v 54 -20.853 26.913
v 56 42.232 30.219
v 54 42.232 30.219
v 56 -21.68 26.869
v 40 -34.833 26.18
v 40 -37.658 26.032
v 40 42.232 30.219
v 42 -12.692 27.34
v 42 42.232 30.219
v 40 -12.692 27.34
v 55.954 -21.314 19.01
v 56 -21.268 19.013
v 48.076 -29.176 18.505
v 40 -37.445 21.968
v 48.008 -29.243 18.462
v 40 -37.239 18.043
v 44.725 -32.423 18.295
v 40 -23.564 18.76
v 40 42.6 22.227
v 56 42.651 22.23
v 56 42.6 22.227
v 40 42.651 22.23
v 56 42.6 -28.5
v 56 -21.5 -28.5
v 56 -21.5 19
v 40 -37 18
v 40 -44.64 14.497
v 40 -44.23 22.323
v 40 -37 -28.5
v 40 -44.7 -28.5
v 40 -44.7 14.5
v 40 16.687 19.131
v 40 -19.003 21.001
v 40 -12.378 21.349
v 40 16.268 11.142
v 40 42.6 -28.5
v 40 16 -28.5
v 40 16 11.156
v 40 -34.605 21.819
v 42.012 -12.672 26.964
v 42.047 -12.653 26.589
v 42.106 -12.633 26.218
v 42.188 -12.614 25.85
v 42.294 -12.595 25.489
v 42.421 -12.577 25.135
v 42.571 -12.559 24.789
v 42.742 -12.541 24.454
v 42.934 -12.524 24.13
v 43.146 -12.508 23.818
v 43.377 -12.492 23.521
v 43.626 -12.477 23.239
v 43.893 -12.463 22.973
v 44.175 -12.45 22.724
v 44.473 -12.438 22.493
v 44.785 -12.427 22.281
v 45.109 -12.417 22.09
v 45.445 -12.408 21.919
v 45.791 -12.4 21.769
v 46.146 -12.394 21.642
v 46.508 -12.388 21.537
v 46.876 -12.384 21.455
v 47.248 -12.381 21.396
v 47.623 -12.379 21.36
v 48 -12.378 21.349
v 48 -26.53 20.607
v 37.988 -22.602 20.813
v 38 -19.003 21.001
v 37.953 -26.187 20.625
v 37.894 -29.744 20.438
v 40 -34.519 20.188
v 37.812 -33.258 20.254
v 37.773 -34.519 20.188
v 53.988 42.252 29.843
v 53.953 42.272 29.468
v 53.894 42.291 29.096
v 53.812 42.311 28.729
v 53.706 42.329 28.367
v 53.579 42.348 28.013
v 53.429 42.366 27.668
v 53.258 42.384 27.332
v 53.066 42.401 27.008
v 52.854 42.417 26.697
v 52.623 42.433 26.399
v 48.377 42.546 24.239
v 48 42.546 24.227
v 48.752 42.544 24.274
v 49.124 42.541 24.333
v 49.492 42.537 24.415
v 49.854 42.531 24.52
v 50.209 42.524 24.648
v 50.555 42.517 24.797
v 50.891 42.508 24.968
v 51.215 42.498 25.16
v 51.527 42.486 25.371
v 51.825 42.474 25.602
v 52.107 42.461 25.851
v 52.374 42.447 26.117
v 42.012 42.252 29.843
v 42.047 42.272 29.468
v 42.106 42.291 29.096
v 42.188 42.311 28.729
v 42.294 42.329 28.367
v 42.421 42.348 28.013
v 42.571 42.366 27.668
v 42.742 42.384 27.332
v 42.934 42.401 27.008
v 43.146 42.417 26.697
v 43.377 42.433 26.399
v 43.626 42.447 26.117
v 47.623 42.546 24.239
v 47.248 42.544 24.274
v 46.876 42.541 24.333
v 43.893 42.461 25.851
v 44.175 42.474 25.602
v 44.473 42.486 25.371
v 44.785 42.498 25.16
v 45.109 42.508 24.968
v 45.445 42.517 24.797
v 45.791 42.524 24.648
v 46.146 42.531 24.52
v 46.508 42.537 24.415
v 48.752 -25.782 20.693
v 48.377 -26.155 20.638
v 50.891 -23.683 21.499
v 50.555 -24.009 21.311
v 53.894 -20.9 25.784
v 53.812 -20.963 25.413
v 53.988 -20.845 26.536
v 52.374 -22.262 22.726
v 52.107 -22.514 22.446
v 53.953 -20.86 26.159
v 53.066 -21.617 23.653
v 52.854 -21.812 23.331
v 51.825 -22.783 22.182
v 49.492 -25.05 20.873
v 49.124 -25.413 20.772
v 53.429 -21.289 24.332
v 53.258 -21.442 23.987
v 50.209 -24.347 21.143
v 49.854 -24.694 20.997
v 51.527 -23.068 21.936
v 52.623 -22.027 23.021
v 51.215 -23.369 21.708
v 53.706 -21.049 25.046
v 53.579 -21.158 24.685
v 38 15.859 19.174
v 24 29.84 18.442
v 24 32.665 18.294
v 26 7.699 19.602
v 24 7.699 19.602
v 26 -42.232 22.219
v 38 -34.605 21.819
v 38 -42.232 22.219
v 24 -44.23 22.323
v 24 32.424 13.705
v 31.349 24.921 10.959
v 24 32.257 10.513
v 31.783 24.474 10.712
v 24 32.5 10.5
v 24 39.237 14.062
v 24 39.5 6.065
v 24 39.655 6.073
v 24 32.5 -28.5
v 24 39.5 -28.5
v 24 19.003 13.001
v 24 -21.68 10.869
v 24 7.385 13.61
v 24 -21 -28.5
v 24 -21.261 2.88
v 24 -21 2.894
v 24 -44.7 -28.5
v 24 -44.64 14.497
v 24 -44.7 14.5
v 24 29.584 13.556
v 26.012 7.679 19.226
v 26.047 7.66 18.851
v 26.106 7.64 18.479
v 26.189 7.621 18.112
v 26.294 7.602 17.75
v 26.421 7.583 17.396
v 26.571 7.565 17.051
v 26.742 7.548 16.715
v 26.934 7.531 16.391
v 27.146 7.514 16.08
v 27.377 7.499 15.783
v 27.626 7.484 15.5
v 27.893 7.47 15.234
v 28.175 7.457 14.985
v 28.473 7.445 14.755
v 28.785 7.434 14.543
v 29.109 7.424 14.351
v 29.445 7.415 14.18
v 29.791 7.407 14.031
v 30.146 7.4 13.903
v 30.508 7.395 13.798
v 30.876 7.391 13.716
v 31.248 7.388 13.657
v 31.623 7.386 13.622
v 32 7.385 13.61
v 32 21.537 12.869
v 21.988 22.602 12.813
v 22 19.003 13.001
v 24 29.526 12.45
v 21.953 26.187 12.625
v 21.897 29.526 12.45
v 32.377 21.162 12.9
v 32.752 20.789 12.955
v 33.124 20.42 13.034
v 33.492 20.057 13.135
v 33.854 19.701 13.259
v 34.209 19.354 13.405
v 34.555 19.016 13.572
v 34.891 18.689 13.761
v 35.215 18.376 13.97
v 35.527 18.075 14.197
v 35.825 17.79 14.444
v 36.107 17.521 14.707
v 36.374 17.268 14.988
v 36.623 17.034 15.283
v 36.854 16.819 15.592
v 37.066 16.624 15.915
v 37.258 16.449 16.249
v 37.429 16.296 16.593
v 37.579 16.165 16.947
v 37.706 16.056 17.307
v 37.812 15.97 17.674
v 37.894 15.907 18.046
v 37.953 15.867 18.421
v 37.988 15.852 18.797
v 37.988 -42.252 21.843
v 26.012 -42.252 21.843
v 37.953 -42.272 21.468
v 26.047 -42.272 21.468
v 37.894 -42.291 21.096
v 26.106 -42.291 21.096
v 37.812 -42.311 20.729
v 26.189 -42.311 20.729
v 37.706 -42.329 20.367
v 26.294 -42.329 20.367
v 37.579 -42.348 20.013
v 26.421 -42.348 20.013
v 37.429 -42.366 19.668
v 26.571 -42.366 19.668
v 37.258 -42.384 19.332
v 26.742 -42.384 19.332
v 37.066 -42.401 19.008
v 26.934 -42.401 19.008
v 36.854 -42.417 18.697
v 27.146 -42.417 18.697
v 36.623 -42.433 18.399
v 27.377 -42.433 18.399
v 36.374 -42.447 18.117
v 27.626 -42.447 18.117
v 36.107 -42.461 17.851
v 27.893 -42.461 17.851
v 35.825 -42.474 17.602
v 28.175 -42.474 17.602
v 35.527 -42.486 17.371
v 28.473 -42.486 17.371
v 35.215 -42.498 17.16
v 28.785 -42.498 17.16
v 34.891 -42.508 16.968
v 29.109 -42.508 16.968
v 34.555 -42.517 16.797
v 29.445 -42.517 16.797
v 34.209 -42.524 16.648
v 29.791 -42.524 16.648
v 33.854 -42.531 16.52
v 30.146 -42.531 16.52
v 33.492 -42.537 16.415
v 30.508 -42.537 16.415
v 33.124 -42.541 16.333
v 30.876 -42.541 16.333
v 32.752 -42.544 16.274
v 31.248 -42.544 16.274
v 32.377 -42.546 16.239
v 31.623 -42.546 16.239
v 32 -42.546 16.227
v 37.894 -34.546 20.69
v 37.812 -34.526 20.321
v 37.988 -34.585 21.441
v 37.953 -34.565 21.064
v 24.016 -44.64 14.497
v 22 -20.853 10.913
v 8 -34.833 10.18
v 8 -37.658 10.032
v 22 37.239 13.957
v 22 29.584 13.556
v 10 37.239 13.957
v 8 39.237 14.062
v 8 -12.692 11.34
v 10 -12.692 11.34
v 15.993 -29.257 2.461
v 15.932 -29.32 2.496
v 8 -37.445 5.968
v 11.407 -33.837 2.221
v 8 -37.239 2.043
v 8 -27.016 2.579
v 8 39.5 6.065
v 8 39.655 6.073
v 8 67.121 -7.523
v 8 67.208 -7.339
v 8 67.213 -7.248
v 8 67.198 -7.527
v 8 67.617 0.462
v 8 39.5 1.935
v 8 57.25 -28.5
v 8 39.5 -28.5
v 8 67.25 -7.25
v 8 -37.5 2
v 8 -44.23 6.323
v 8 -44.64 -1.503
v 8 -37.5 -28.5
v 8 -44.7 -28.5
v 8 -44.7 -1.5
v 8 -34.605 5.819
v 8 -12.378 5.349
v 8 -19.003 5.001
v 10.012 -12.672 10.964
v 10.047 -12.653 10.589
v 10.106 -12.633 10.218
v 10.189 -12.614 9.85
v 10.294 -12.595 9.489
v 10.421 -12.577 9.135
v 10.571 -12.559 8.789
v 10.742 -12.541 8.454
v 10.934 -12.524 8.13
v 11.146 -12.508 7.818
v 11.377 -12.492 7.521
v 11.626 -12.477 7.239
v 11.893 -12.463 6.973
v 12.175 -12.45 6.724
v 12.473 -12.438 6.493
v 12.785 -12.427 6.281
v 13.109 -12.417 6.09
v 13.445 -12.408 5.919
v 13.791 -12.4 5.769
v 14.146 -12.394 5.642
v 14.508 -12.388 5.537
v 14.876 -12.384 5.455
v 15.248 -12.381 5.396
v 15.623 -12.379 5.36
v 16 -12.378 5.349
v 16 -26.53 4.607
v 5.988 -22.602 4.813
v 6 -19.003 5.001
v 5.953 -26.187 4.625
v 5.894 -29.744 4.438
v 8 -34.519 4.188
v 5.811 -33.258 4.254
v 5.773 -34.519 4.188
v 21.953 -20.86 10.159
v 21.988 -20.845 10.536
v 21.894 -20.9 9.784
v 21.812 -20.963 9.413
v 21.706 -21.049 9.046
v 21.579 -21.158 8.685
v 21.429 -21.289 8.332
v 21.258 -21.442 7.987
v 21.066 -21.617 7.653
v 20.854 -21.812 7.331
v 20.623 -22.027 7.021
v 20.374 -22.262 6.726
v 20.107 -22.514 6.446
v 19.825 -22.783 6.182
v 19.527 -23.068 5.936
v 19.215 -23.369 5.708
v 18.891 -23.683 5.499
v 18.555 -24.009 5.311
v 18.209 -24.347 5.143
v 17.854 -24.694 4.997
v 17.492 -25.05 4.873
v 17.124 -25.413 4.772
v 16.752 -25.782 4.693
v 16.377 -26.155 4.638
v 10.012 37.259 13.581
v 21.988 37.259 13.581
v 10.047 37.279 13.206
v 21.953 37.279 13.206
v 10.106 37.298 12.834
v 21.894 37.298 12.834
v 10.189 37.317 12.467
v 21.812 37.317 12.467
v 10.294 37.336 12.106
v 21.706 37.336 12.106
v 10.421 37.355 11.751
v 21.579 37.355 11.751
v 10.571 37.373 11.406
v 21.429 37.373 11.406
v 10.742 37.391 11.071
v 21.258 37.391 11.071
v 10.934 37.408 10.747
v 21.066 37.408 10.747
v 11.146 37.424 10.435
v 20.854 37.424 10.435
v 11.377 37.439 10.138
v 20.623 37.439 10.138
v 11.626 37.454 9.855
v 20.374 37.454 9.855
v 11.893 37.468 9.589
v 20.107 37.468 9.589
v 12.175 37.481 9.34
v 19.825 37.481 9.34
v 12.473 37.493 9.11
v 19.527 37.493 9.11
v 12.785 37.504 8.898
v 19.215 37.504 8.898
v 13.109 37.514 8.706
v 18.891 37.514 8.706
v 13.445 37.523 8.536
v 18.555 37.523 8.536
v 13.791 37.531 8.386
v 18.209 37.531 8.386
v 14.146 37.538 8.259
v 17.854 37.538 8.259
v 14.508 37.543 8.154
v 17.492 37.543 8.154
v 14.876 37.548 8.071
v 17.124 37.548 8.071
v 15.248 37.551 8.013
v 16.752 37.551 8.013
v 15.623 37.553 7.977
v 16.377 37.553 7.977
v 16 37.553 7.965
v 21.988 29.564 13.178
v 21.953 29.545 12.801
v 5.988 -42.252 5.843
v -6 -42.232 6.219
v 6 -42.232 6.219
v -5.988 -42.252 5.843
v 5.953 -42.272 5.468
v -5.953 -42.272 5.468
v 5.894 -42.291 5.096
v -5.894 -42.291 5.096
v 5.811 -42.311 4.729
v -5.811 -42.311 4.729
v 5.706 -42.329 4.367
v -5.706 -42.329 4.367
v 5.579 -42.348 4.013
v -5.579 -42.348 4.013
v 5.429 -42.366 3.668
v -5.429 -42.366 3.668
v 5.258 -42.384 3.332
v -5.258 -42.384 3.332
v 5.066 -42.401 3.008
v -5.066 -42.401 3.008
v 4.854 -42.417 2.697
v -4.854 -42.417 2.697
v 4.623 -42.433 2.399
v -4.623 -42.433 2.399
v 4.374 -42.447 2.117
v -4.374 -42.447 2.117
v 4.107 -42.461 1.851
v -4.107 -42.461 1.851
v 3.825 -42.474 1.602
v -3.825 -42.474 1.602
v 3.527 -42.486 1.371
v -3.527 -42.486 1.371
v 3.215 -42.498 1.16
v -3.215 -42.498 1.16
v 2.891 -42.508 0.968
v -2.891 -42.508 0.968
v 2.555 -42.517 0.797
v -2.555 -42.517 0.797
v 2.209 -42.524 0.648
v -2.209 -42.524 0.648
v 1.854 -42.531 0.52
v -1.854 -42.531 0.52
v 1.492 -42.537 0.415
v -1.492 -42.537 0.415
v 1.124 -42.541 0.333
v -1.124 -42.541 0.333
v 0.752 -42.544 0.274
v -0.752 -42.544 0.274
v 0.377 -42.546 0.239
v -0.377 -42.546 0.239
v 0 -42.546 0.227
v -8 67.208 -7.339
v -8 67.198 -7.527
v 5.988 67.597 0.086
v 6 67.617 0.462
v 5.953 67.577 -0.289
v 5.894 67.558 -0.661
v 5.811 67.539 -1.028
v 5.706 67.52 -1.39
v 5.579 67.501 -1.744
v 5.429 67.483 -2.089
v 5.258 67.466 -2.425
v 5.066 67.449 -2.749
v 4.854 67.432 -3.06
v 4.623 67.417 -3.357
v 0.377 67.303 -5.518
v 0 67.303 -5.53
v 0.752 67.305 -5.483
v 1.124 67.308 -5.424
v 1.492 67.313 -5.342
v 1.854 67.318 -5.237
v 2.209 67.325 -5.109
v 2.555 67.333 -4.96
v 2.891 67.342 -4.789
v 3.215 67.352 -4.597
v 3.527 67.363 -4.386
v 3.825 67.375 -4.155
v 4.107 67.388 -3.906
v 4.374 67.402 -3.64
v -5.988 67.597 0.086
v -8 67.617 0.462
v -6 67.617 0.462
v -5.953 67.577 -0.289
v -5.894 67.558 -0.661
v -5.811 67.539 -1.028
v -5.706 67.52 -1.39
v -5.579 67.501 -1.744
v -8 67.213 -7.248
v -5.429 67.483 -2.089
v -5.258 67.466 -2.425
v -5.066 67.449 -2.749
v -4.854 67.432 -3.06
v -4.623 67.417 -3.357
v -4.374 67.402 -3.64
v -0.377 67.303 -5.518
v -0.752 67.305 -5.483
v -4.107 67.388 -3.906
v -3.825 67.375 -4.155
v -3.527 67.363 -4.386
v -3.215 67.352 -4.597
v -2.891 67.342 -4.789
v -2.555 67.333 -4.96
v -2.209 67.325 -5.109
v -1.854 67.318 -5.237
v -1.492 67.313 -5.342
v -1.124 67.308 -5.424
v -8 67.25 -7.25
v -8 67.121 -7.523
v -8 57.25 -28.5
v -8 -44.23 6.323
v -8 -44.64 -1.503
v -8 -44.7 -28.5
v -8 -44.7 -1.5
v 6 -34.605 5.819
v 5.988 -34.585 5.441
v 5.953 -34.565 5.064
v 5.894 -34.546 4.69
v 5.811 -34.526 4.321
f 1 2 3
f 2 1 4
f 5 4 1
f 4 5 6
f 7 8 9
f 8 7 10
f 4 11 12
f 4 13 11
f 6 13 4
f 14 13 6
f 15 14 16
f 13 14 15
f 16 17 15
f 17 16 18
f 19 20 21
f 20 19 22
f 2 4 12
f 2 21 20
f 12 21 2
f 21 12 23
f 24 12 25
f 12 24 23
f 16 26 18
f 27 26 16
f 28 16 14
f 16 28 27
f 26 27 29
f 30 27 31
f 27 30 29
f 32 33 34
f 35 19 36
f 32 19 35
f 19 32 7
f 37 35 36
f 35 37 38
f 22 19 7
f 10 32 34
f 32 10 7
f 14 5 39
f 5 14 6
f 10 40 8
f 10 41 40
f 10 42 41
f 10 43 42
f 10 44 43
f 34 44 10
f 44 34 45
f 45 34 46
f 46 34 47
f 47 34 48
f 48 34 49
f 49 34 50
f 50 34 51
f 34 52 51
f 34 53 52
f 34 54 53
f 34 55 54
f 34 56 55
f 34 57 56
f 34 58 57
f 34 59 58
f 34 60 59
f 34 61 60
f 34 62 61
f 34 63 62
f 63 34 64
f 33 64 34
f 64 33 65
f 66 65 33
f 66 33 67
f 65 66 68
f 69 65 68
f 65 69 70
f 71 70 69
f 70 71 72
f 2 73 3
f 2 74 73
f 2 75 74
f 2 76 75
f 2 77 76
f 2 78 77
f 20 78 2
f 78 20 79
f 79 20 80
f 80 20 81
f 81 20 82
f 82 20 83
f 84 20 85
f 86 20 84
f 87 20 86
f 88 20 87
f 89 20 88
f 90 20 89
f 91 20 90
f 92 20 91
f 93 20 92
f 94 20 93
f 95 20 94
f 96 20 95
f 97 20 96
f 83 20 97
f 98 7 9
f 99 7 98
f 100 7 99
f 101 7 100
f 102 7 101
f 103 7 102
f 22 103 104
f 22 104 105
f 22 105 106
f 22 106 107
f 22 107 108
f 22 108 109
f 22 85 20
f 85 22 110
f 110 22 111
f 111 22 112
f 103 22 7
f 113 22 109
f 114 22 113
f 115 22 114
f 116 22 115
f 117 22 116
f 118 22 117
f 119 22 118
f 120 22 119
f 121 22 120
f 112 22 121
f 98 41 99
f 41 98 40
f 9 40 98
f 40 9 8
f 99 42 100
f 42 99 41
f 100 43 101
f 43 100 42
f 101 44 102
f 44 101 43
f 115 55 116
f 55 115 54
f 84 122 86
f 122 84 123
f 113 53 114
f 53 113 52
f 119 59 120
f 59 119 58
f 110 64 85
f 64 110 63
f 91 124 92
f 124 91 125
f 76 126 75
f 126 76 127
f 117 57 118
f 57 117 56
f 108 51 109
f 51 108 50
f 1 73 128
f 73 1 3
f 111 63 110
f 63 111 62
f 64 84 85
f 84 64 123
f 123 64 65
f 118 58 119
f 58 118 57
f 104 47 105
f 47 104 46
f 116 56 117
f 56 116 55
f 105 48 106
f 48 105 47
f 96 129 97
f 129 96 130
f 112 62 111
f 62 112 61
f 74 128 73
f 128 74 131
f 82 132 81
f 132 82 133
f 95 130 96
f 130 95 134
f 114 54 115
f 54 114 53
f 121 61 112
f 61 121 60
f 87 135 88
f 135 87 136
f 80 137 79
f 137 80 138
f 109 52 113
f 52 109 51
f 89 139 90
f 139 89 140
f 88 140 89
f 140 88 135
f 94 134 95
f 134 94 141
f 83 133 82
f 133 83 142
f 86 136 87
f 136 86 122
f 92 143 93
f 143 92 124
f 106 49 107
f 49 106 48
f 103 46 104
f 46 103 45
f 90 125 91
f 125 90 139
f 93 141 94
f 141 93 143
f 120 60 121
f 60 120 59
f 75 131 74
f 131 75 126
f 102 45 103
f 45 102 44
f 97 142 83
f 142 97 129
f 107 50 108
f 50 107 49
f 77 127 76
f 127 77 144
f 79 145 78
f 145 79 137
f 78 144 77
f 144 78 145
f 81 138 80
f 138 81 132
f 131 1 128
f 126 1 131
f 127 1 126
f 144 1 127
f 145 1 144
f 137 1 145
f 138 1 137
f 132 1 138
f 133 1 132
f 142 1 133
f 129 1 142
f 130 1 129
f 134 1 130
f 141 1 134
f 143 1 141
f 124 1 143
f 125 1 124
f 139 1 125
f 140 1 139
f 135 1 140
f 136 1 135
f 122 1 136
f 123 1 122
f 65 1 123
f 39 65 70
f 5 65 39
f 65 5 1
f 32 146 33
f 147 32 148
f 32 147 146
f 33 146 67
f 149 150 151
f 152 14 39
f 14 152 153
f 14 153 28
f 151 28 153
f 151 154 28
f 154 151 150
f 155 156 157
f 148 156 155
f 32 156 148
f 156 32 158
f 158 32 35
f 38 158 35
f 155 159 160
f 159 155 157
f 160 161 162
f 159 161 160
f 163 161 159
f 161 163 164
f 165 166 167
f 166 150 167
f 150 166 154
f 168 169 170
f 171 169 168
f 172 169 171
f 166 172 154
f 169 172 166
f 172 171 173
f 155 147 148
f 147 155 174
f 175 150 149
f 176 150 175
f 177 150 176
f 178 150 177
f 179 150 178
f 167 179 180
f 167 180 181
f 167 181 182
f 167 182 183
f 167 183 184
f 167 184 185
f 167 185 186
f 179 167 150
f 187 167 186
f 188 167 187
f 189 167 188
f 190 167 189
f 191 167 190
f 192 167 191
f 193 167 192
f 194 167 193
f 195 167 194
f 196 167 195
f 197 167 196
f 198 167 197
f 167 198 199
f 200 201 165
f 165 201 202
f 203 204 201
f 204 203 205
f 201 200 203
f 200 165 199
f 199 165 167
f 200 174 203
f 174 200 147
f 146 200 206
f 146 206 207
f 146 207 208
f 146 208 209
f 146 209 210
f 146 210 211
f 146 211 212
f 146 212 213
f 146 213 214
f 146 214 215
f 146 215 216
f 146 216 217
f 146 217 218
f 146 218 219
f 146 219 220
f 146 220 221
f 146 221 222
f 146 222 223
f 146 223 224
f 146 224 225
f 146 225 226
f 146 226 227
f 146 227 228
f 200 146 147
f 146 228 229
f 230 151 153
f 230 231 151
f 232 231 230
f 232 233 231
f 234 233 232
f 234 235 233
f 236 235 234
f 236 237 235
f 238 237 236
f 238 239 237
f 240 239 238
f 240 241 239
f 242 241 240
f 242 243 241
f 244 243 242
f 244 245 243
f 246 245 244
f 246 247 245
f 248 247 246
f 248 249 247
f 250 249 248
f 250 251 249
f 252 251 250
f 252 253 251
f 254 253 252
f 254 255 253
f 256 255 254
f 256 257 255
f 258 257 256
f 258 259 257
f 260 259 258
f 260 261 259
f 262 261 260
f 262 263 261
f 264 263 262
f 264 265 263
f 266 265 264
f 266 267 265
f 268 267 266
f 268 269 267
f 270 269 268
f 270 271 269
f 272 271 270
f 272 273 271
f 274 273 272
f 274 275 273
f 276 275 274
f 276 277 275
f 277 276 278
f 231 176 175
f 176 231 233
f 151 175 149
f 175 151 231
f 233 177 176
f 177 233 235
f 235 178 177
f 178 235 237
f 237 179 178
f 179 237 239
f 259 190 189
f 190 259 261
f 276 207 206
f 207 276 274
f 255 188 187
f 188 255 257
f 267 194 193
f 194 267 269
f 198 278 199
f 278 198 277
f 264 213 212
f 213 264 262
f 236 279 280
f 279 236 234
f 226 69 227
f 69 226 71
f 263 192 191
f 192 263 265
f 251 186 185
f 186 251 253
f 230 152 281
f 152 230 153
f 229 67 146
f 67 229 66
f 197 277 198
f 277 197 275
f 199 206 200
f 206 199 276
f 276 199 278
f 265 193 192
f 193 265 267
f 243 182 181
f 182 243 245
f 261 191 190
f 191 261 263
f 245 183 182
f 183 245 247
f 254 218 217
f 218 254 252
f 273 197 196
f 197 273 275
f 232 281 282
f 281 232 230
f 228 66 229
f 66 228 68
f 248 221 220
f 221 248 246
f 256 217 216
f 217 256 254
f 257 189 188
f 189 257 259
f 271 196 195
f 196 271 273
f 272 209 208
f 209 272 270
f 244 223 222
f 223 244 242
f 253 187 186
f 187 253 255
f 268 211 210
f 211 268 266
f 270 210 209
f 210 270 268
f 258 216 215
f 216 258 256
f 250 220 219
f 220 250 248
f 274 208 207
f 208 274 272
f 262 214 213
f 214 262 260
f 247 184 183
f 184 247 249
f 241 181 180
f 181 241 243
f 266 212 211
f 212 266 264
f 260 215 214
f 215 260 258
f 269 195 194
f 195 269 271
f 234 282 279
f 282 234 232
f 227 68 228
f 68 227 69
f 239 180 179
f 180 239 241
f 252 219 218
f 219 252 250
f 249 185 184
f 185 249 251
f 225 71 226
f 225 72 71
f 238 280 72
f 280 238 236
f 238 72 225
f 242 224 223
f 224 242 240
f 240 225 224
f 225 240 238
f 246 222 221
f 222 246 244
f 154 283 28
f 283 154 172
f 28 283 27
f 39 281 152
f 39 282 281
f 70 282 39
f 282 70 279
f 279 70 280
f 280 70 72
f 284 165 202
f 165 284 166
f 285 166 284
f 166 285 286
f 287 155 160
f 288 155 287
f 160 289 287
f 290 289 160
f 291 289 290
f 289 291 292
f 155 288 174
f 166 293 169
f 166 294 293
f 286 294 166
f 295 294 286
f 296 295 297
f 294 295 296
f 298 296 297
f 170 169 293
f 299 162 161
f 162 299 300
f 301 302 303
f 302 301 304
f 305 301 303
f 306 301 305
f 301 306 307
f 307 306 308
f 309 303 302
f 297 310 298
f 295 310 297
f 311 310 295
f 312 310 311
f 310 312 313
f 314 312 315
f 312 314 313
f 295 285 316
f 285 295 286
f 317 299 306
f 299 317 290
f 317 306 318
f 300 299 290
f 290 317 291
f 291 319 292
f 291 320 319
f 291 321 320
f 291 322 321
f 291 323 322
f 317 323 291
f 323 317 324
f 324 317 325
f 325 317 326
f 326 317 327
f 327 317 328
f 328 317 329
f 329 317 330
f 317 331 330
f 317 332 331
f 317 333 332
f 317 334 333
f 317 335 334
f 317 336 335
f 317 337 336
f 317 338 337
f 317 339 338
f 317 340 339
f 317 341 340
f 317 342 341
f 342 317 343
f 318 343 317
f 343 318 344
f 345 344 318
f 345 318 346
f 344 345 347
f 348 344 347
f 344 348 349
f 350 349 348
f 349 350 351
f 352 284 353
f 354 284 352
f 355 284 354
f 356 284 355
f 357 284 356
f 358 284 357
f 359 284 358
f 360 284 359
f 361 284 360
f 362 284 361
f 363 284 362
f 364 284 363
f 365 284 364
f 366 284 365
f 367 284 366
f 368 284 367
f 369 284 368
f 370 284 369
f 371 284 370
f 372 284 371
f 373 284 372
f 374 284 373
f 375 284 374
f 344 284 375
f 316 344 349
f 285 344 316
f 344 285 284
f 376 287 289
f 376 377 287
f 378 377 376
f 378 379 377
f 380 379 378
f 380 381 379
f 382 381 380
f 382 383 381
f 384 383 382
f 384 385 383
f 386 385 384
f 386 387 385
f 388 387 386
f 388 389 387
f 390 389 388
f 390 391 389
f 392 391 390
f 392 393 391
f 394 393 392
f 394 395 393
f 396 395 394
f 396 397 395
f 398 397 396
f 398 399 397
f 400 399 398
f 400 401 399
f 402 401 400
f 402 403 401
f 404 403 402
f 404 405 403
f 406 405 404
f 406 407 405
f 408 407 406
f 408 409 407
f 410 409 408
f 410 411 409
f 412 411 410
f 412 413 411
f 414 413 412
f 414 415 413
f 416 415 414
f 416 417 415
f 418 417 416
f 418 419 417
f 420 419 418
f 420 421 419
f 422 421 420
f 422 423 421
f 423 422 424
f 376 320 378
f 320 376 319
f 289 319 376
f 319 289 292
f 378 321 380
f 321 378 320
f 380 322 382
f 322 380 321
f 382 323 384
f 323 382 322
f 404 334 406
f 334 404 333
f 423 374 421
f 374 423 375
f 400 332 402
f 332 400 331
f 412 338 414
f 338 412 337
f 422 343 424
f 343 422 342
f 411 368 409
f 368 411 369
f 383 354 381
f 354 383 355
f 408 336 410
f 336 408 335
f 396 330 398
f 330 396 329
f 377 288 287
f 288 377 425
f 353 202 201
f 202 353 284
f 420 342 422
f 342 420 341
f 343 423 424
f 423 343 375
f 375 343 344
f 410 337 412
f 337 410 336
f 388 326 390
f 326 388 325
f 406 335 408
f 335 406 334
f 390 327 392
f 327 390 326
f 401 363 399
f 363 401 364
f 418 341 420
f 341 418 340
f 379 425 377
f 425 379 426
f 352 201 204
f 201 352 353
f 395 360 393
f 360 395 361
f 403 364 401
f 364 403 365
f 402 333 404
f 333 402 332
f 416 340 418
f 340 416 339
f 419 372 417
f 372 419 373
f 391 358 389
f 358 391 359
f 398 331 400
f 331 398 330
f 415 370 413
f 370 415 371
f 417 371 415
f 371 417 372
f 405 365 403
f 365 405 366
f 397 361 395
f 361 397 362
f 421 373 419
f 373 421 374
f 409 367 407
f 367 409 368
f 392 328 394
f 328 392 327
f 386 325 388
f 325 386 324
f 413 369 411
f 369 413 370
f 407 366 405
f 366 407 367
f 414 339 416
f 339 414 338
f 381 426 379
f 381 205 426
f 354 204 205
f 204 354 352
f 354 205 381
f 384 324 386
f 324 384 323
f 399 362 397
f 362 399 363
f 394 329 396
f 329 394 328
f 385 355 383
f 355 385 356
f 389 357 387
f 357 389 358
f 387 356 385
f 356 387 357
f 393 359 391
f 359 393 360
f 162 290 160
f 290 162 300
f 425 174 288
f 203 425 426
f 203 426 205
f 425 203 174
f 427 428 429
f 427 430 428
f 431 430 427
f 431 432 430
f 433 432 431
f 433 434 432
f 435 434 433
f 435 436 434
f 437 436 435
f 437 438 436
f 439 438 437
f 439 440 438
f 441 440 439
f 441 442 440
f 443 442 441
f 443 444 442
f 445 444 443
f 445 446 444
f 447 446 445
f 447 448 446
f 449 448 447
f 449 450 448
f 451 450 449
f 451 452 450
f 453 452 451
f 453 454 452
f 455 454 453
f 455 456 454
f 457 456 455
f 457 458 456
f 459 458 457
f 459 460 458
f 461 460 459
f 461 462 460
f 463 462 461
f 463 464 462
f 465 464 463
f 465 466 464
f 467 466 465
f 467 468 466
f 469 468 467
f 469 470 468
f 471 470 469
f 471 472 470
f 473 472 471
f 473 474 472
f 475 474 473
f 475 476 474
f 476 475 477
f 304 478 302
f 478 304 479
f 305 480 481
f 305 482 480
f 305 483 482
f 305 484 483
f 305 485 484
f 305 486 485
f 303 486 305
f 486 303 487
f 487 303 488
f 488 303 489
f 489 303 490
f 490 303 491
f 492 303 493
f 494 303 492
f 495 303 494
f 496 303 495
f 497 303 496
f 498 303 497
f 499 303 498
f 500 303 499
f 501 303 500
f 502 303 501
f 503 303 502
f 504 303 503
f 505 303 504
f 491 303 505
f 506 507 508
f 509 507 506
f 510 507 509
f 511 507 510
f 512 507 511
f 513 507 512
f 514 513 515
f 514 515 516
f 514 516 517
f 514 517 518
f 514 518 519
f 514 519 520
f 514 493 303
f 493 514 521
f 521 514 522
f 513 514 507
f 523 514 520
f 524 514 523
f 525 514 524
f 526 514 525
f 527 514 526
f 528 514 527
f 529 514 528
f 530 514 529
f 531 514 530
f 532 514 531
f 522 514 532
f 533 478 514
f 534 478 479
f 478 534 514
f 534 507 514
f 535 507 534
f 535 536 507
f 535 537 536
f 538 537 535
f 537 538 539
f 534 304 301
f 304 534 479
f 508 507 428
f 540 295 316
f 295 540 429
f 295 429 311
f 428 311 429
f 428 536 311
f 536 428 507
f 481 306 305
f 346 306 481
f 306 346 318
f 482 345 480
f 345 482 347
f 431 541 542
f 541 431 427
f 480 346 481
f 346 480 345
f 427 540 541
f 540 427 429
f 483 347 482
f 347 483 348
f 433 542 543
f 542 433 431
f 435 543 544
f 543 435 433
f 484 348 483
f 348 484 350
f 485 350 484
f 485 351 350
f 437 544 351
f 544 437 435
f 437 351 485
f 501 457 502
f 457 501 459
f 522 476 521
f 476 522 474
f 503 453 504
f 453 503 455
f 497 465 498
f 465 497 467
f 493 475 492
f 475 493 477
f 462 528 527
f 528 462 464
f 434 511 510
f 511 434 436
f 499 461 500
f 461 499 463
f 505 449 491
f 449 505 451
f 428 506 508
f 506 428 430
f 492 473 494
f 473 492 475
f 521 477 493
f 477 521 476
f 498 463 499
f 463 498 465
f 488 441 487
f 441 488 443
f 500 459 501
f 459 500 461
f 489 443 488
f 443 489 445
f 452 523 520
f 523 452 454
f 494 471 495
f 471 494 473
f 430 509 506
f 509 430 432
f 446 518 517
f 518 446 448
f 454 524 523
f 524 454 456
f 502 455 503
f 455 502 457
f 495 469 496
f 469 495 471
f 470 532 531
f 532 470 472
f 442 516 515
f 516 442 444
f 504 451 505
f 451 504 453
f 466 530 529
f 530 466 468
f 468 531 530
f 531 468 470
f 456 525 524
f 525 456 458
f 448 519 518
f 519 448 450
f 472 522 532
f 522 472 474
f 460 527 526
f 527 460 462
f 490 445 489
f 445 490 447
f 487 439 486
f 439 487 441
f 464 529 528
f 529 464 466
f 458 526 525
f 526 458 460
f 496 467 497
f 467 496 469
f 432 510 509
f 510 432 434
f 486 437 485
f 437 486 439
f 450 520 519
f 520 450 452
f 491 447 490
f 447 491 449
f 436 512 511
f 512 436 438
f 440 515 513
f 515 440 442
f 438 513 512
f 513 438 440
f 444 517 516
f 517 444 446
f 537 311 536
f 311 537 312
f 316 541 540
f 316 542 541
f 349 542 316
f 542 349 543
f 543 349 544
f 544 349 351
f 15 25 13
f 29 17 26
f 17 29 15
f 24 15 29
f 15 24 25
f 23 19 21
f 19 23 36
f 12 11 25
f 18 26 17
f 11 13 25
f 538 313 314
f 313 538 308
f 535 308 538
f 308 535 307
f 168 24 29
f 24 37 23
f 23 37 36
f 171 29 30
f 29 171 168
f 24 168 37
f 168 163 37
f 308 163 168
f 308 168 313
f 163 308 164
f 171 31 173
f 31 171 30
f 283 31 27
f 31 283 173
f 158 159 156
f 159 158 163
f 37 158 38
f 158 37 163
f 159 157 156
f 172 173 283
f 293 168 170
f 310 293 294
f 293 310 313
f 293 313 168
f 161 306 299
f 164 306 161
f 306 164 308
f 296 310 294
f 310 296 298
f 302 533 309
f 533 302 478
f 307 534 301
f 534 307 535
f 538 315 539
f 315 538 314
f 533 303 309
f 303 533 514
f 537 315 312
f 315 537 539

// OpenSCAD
module ball_channel(length, diverter = false, endcap = false, mask = false) {
	translate(v = [-(16/2), -(length/2), (8/2)])
	rotate(a = -90, v = [1, 0, 0])
	union() {
		difference() {
			cube(
				size = [16, 8, length]
			);
			
			translate(v = [8, 0, 0])
			cylinder(
				h = length,
				r = 6,
				$fn = 100
			);
	
			if (diverter) {
				polyhedron(
					points = [
						[0, 0, 0],
						[16, 0, 0],
						[16, 8, 0],
						[0, 8, 0],
						[0, 0, 16],
						[0, 8, 16]
					],
					faces = [
						[0, 1, 2, 3],
						[0, 4, 1],
						[3, 2, 5],
						[0, 3, 5, 4],
						[1, 4, 5, 2]
					]
				);
	
				translate(v = [8, 0, 0])
				cube(
					size = [8, 6, 25]
				);
			}
		}

		if (mask && diverter) {
			translate(v = [8, 0, sqrt(2*2+2*2)])
			cube(
				size = [8*2, 6, 25]
			);
		}
	
		if (diverter) {
			difference() {
				translate(v = [0, 0, 16])
				rotate(a = 45, v = [0, 1, 0])
				cube(
					size = [sqrt(16*16+16*16), 8, 2]
				);
	
				translate(v = [16, 0, 0])
				cube(size = [2, 8, 3]);
			}
		}

		if (endcap) {
				translate(v = [0, 0, length])
				cube(
					size = [16, 8, 2]
				);

		}
	}
}

module position_ball_channel(angle, level = 0) {
	translate(v = [16*level, 0, 8*level])
	rotate(a = angle, v = [1, 0, 0])
	children();
}


module ball_ladder() {
	position_ball_channel(angle = 3, level = 3)
	translate(v = [0, 2.5, 0])
	mirror([1, 0, 0])
	ball_channel(length = 80, diverter = true);
	
	difference() {
		position_ball_channel(angle = -3, level = 2)
		translate(v = [0, -5, 0])
		rotate(a = 180, v = [0, 0, 1])
		ball_channel(length = 75, diverter = true, endcap = true);
	
		position_ball_channel(angle = 3, level = 3)
		translate(v = [0, 2.5, 0])
		mirror([1, 0, 0])
		ball_channel(length = 80, diverter = true, mask = true);
	}
	
	difference() {
		position_ball_channel(angle = 3, level = 1)
		mirror([1, 0, 0])
		ball_channel(length = 75, diverter = true, endcap = true);
	
		position_ball_channel(angle = -3, level = 2)
		translate(v = [0, -5, 0])
		rotate(a = 180, v = [0, 0, 1])
		ball_channel(length = 75, diverter = true, endcap = true, mask = true);
	}
	
	difference() {
		position_ball_channel(angle = -3)
		translate(v = [0, 25/2, 0])
		mirror([0, 1, 0])
		ball_channel(length = 85+25, endcap = true);
	
		position_ball_channel(angle = 3, level = 1)
		mirror([1, 0, 0])
		ball_channel(length = 75, diverter = true, endcap = true, mask = true);
	}
}

module ball_ladder_support() {
	polyhedron(
		points = [
			// back points
			[16*3+8, 80/2+2.6, 8*3-1.5],
			[16*3+8, 80/2+2.6, -28.5],
			[16*3-8, 80/2+2.6, 8*3-1.5],
			[16*3-8, 80/2+2.6, -28.5],

			// front points
			[16*3+8, -80/2+18.5, 8*3-5],
			[16*3+8, -80/2+18.5, -28.5],
			[16*3-8, -80/2+3, 8*3-6],
			[16*3-8, -80/2+3, -28.5],
		],
		faces = [
			[0, 2, 3, 1],
			[6, 4, 5, 7],
			[4, 0, 1, 5],
			[2, 6, 7, 3],
			[1, 3, 7, 5],
			[6, 2, 0, 4]
		]
	);

	polyhedron(
		points = [
			// back points
			[16*2+8, 75/2-21.5, 8*2-4.5],
			[16*2+8, 75/2-21.5, -28.5],
			[16*2-8, 75/2-5, 8*2-5.5],
			[16*2-8, 75/2-5, -28.5],

			// front points
			[16*2+8, -75/2-7.2, 8*2-1.5],
			[16*2+8, -75/2-7.2, -28.5],
			[16*2-8, -75/2-7.2, 8*2-1.5],
			[16*2-8, -75/2-7.2, -28.5],
		],
		faces = [
			[0, 2, 3, 1],
			[6, 4, 5, 7],
			[4, 0, 1, 5],
			[2, 6, 7, 3],
			[1, 3, 7, 5],
			[6, 2, 0, 4]
		]
	);

	polyhedron(
		points = [
			// back points
			[16*1+8, 75/2+2, 8*1-1.75],
			[16*1+8, 75/2+2, -28.5],
			[16*1-8, 75/2+2, 8*1-1.75],
			[16*1-8, 75/2+2, -28.5],

			// front points
			[16*1+8, -75/2+16.5, 8*1-5],
			[16*1+8, -75/2+16.5, -28.5],
			[16*1-8, -75/2, 8*1-6],
			[16*1-8, -75/2, -28.5],
		],
		faces = [
			[0, 2, 3, 1],
			[6, 4, 5, 7],
			[4, 0, 1, 5],
			[2, 6, 7, 3],
			[1, 3, 7, 5],
			[6, 2, 0, 4]
		]
	);

	polyhedron(
		points = [
			// back points
			[16*0+8, 80/2+27.25, 8*0-7.25],
			[16*0+8, 80/2+27.25-10, -28.5],
			[16*0-8, 80/2+27.25, 8*0-7.25],
			[16*0-8, 80/2+27.25-10, -28.5],

			// front points
			[16*0+8, -80/2-4.7, 8*0-1.5],
			[16*0+8, -80/2-4.7, -28.5],
			[16*0-8, -80/2-4.7, 8*0-1.5],
			[16*0-8, -80/2-4.7, -28.5],
		],
		faces = [
			[0, 2, 3, 1],
			[6, 4, 5, 7],
			[4, 0, 1, 5],
			[2, 6, 7, 3],
			[1, 3, 7, 5],
			[6, 2, 0, 4]
		]
	);
}

ball_ladder();
color([0, 1, 1])
ball_ladder_support();
